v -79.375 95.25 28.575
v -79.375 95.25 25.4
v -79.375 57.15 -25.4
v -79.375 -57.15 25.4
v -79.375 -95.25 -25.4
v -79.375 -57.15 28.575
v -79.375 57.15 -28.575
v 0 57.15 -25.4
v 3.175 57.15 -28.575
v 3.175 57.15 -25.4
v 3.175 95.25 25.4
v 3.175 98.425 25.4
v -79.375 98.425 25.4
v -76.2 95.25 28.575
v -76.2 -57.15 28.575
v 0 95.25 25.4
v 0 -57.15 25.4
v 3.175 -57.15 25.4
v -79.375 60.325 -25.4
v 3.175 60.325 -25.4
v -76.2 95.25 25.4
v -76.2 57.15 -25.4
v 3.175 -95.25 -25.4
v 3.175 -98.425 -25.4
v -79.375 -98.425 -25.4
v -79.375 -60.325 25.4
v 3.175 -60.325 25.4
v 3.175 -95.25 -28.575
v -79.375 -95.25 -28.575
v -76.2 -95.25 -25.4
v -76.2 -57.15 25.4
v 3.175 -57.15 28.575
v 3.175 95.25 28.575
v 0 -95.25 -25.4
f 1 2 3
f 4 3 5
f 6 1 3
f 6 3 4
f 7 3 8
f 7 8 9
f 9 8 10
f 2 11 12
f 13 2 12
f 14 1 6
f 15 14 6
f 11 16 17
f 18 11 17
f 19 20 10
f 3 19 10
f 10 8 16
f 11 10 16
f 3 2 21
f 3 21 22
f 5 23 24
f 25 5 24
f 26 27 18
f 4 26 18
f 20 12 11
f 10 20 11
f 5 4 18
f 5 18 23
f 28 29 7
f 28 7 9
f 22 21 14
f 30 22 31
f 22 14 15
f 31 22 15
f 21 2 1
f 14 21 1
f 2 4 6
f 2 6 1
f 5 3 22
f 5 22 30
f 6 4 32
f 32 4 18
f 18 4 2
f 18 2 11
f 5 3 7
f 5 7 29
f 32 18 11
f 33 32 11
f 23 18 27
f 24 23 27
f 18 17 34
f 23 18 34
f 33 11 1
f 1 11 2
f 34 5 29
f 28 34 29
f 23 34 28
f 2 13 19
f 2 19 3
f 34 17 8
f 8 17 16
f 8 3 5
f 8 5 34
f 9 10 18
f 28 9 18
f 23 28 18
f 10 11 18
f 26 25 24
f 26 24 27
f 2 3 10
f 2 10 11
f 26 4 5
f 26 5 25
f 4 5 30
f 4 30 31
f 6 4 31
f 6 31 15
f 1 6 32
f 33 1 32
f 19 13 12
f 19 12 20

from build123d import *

# Parameters (mm, degrees)
F1_DEPTH  = 3.175
F2_W      = 3.175
F2_H      = 152.4
F2_W_2    = 79.375
F3_DEPTH  = 3.175
F4_W      = 82.55
F4_H      = 152.4
F5_DEPTH  = 3.175
F6_W      = 152.4
F6_H      = 3.175
F7_DEPTH  = 3.175
F9_DEPTH  = 82.55
F11_DEPTH = 82.55


with BuildPart() as f1:
    # F0 (on Right) → F1 (new body)
    with BuildSketch(Plane.YZ):
        Polygon((57.15, -25.4), (95.25, 25.4), (-57.15, 25.4), (-95.25, -25.4), align=None)
    extrude(amount=F1_DEPTH)

    # F4 (on face) → F5 (join)
    with BuildSketch(Plane(origin=(0, 0, -25.4), x_dir=(1, 0, 0), z_dir=(0, 0, -1))):
        with Locations((-38.1, 19.05)):
            Rectangle(F4_W, F4_H)
    extrude(amount=F5_DEPTH)


with BuildPart() as f3:
    # F2 (on face) → F3 (new body)
    with BuildSketch(Plane.XY.offset(25.4)):
        with Locations((1.5875, 19.05)):
            Rectangle(F2_W, F2_H)
        with Locations((-39.6875, 19.05)):
            Rectangle(F2_W_2, F2_H)
    extrude(amount=F3_DEPTH)


with BuildPart() as f7:
    # F6 (on face) → F7 (new body)
    with BuildSketch(Plane(origin=(-79.375, 0, 0), x_dir=(0, -1, 0), z_dir=(-1, 0, 0))):
        Polygon((57.15, 25.4), (-95.25, 25.4), (-57.15, -25.4), (95.25, -25.4), align=None)
        with Locations((-19.05, 26.9875)):
            Rectangle(F6_W, F6_H)
    extrude(amount=-F7_DEPTH)


with BuildPart() as f9:
    # F8 (on face) → F9 (new body)
    with BuildSketch(Plane(origin=(-79.375, 0, 0), x_dir=(0, -1, 0), z_dir=(-1, 0, 0))):
        Polygon((-98.425, 25.4), (-60.325, -25.4), (-57.15, -25.4), (-95.25, 25.4), align=None)
    extrude(amount=-F9_DEPTH)


with BuildPart() as f11:
    # F10 (on face) → F11 (new body)
    with BuildSketch(Plane(origin=(-79.375, 0, 0), x_dir=(0, -1, 0), z_dir=(-1, 0, 0))):
        Polygon((60.325, 25.4), (57.15, 25.4), (95.25, -25.4), (98.425, -25.4), align=None)
    extrude(amount=-F11_DEPTH)


solid = Compound([f1.part, f3.part, f7.part, f9.part, f11.part])
